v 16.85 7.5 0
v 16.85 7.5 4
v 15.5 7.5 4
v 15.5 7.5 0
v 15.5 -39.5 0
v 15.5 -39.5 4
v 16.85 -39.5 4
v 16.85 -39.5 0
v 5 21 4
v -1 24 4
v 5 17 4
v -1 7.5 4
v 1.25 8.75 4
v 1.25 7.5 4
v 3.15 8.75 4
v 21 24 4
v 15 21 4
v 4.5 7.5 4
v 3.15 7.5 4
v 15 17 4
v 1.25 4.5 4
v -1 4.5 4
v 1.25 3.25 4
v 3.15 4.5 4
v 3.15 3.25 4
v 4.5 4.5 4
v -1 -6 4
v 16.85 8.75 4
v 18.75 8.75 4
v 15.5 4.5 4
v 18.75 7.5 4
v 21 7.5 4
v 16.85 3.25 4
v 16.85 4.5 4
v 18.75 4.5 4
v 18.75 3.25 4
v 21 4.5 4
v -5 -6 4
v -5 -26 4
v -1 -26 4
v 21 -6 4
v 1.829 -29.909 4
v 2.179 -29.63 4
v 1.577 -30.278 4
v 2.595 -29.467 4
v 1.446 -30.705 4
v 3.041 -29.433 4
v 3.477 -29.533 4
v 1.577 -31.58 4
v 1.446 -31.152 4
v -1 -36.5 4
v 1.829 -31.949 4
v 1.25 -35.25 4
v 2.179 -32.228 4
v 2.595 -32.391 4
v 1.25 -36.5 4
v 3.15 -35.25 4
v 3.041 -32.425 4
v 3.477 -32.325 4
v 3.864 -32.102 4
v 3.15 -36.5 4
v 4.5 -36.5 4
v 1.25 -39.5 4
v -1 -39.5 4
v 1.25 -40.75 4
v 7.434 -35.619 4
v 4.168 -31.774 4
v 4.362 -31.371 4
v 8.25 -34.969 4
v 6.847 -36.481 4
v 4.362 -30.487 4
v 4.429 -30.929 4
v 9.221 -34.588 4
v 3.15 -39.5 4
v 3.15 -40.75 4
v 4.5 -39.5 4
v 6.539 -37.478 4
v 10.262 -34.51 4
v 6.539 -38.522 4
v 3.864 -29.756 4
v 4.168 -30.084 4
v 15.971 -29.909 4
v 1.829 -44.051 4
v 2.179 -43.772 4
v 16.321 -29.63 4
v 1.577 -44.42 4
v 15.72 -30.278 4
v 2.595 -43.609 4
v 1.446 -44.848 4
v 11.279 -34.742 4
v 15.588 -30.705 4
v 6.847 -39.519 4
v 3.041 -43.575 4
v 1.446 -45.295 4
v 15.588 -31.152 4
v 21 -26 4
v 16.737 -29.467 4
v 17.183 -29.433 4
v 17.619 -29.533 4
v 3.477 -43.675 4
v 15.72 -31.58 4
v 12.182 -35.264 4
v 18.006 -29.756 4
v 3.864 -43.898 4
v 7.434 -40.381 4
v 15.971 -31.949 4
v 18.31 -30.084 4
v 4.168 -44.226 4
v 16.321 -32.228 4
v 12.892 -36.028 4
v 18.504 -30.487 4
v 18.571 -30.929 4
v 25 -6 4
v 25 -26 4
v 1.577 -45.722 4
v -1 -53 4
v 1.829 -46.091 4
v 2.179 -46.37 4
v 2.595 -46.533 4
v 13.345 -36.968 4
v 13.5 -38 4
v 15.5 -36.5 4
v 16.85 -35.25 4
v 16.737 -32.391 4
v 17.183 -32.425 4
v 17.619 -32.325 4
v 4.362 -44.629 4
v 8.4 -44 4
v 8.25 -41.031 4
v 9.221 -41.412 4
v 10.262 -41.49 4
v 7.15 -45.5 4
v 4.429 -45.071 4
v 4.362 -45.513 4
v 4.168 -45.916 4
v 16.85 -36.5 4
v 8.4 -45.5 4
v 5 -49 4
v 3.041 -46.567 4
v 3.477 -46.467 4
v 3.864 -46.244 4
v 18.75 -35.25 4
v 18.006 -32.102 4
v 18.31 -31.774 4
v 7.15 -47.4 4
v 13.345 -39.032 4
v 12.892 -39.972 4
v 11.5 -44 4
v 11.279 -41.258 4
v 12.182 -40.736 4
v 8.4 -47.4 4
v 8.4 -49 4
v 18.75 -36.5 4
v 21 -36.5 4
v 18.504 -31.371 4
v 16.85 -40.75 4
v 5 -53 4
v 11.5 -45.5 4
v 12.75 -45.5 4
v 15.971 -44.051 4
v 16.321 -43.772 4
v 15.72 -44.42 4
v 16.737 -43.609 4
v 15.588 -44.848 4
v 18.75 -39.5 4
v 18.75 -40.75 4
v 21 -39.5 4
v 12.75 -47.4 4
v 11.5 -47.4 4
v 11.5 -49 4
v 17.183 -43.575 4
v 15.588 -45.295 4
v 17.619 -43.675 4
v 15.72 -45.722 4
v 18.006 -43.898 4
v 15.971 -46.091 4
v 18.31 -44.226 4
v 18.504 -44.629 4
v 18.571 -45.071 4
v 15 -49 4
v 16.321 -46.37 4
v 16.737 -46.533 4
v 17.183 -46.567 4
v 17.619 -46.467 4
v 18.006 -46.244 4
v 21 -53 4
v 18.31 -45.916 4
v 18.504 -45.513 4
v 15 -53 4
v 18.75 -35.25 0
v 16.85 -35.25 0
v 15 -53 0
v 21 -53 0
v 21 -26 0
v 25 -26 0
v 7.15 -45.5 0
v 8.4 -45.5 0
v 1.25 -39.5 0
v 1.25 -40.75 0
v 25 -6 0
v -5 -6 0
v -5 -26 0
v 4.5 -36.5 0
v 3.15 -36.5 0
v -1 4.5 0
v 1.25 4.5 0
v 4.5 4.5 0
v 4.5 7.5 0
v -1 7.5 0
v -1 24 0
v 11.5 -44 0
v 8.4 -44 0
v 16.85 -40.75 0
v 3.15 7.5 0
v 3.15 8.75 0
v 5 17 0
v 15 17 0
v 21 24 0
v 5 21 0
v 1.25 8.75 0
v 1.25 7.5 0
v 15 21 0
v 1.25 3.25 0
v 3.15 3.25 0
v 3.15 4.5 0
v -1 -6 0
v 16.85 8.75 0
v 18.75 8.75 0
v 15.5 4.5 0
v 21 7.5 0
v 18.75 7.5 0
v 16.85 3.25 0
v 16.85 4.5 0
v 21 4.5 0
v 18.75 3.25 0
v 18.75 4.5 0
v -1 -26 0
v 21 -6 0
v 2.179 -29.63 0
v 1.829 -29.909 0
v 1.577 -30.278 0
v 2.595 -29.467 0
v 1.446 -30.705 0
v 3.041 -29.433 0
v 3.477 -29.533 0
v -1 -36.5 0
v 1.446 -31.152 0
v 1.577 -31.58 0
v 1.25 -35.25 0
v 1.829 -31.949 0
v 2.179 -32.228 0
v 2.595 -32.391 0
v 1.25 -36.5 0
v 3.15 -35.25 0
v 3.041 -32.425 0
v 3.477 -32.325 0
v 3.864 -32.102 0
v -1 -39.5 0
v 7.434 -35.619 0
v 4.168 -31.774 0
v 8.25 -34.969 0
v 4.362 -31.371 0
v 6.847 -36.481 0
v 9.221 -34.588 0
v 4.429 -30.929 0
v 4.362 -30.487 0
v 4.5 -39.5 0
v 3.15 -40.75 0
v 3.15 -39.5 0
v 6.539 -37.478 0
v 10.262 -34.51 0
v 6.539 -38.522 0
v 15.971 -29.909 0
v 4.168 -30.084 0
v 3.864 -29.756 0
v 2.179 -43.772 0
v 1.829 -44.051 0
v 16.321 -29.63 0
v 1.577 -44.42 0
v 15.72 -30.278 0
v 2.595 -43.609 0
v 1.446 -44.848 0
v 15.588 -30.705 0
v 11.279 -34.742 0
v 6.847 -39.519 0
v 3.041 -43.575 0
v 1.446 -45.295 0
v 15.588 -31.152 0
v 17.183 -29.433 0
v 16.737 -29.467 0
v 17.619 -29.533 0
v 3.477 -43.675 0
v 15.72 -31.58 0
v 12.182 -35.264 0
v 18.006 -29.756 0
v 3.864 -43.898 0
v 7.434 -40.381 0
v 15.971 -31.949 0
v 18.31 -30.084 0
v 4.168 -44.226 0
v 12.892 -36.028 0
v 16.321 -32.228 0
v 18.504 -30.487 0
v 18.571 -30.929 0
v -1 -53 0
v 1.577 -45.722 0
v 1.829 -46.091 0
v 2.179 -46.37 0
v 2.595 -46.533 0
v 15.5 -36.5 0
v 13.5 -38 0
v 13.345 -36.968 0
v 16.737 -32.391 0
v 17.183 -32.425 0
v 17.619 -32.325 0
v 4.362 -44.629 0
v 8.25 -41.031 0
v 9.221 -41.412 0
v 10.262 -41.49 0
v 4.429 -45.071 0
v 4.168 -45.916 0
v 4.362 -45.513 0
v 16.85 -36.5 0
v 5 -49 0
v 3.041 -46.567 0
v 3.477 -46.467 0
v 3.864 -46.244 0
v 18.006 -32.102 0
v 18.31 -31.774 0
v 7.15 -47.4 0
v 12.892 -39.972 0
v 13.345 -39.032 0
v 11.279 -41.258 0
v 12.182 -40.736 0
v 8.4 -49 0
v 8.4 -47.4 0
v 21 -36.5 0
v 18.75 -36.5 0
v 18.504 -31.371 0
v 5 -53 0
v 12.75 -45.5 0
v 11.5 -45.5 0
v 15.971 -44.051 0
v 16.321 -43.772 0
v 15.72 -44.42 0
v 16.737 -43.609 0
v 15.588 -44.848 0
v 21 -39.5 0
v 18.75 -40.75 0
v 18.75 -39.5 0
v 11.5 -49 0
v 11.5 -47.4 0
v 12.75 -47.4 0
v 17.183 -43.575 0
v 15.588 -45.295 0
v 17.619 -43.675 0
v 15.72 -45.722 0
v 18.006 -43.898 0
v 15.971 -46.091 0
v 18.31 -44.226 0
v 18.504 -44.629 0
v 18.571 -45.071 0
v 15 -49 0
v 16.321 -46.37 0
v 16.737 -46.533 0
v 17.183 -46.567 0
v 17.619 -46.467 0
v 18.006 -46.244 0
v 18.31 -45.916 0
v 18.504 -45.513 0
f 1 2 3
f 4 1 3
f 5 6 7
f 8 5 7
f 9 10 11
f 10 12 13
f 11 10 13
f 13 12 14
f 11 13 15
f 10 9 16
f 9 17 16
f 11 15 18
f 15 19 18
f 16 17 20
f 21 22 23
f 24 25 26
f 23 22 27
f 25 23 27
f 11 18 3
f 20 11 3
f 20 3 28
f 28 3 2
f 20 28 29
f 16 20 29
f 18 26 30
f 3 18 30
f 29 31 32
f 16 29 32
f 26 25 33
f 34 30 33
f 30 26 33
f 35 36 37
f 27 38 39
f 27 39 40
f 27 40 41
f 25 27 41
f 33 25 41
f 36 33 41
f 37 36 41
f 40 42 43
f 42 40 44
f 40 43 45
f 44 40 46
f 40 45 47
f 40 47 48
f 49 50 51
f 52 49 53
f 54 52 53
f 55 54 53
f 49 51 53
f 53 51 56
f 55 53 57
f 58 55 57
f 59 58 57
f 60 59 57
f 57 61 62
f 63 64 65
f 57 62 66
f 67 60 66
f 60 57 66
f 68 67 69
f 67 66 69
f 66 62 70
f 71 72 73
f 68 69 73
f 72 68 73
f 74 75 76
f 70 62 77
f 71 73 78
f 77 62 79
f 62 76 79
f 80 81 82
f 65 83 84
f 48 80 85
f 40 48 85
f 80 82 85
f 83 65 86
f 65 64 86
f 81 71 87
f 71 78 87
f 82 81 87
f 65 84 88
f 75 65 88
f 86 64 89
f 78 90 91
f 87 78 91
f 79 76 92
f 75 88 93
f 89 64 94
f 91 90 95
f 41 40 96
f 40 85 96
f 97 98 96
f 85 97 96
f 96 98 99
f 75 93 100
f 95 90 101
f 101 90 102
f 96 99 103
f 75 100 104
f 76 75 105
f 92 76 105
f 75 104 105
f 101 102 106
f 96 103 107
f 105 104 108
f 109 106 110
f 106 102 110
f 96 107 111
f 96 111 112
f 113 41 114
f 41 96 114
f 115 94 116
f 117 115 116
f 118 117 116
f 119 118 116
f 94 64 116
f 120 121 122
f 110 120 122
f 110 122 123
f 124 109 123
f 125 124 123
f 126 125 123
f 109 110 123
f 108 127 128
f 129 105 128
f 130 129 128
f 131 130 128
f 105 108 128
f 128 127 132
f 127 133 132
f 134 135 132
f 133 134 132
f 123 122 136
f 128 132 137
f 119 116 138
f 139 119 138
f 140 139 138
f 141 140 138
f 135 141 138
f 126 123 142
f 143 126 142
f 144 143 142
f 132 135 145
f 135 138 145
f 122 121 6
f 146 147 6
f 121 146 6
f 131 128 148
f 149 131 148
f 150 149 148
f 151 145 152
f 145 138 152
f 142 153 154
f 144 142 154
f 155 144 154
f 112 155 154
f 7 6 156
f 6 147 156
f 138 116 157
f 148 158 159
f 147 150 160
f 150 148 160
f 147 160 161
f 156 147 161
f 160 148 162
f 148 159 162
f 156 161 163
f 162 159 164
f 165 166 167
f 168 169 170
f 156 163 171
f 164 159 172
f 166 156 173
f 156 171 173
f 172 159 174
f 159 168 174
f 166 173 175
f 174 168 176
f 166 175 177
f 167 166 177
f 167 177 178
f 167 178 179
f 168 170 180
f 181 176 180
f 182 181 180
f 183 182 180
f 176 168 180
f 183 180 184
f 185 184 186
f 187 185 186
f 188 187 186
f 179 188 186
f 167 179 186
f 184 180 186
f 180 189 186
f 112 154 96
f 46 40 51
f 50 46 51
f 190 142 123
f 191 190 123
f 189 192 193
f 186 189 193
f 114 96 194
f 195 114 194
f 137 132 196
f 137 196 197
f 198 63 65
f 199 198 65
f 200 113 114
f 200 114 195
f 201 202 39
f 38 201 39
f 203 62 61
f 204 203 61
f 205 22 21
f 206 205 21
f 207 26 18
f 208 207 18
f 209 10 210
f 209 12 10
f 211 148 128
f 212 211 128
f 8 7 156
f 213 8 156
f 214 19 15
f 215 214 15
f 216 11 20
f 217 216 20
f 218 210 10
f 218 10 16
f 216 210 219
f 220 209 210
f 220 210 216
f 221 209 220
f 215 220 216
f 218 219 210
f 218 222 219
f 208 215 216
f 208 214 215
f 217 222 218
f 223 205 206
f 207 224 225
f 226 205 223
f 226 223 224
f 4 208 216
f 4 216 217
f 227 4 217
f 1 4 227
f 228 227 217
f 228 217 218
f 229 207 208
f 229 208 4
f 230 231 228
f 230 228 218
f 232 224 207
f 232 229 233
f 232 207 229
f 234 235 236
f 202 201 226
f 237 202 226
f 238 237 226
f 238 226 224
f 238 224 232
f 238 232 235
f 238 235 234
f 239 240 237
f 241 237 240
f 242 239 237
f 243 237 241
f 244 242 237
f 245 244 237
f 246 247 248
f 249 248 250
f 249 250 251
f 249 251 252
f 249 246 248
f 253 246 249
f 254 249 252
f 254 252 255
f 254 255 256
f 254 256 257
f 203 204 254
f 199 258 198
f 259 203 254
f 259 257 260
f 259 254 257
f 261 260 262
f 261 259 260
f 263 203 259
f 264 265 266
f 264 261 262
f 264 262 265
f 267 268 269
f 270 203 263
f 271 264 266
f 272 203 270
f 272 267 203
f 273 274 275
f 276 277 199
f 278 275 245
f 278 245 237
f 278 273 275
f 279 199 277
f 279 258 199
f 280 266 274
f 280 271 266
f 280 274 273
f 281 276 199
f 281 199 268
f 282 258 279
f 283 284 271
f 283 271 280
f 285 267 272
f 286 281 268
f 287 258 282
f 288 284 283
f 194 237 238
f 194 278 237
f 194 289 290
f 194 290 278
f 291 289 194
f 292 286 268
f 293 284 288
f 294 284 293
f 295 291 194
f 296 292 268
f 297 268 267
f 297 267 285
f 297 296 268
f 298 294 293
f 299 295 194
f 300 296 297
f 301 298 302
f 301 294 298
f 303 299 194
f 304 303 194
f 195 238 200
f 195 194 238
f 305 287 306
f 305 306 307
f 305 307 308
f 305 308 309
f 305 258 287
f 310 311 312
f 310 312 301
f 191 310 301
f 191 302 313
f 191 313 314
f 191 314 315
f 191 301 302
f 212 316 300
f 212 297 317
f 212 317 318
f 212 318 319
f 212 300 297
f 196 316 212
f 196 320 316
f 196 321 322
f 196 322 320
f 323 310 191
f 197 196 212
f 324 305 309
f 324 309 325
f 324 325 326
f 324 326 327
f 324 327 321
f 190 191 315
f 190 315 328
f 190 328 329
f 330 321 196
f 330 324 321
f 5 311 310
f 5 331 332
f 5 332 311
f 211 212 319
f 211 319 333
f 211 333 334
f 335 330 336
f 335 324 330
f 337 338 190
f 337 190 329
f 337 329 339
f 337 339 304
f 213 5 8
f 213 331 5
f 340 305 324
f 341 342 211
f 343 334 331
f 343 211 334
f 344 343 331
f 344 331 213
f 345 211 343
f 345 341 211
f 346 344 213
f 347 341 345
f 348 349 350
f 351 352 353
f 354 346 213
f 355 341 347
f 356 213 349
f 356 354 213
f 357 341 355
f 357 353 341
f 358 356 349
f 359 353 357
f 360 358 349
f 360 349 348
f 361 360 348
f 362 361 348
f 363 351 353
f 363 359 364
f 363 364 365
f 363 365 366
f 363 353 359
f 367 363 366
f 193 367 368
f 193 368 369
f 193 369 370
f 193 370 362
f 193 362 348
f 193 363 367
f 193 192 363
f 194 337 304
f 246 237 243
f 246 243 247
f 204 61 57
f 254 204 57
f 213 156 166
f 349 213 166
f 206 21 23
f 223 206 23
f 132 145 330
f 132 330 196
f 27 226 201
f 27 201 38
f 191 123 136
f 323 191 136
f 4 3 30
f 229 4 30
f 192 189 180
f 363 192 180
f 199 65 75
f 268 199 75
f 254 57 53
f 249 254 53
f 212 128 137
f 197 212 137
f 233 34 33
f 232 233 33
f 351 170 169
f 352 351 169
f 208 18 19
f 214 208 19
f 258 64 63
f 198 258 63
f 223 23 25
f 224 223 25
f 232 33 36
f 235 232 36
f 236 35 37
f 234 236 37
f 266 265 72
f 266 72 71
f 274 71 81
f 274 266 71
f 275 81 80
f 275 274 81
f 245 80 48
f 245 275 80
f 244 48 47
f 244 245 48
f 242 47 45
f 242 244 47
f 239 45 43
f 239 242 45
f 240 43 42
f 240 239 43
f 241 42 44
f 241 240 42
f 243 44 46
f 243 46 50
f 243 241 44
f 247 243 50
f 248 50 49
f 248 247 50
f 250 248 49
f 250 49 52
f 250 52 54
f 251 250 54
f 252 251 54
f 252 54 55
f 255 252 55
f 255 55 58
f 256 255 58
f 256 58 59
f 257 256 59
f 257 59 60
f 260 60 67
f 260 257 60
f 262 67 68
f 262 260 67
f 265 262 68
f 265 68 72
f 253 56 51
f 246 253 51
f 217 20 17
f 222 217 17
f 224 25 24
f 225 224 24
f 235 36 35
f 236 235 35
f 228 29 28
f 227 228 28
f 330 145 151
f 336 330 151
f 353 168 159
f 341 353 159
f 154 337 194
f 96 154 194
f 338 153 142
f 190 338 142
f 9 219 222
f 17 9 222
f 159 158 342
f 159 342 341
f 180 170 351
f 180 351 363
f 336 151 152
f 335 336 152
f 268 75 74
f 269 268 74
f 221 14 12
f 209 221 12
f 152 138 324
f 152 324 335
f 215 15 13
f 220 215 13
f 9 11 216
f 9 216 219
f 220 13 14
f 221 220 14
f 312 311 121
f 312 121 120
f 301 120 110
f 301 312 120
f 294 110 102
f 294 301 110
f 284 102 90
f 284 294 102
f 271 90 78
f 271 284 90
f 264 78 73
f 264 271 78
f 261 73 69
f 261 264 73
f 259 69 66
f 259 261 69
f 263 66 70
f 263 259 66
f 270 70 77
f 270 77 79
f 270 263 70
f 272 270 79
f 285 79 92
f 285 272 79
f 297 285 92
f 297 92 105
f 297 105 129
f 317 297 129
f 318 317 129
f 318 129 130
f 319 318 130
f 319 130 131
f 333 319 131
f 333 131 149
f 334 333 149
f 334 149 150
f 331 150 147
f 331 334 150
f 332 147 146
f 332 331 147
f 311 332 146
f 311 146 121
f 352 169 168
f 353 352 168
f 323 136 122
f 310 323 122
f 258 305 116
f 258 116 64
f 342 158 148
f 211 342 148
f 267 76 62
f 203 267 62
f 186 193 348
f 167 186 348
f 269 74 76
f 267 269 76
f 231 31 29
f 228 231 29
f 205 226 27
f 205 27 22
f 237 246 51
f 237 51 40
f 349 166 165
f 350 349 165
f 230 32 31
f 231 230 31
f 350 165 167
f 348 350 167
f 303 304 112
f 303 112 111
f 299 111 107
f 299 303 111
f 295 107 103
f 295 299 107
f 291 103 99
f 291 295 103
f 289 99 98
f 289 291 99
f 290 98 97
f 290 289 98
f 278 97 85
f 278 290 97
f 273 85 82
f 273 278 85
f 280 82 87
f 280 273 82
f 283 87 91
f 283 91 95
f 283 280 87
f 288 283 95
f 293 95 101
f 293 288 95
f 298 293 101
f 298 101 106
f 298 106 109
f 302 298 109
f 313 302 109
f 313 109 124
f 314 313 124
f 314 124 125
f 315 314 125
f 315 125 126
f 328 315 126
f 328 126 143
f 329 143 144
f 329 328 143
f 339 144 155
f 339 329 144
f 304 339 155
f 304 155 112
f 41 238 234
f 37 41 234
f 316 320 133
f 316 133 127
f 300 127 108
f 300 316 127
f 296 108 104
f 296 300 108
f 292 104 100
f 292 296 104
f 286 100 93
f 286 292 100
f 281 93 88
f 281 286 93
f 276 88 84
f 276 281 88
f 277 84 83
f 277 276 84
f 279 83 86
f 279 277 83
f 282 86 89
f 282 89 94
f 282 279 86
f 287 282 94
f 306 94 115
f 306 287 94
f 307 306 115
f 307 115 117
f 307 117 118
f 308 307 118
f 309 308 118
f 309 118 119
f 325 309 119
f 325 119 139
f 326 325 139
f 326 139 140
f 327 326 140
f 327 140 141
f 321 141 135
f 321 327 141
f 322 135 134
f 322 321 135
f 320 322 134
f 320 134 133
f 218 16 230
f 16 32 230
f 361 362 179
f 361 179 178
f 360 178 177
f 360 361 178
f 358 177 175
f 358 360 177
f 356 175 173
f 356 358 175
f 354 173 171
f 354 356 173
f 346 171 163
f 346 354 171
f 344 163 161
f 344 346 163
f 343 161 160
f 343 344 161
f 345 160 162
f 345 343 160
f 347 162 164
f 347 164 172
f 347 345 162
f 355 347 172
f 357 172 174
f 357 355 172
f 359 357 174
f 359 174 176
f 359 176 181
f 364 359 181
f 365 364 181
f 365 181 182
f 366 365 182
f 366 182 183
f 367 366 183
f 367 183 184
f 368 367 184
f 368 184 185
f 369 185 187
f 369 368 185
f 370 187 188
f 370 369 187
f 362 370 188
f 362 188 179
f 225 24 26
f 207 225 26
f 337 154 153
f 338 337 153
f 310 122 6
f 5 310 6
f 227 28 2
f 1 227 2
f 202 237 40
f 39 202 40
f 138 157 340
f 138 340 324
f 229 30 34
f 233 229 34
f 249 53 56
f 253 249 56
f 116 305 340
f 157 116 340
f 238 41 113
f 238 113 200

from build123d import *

# Parameters (mm, degrees)
SKETCH1_W                     = 22
SKETCH1_H                     = 74
SKETCH1_R                     = 3.5
SHEET_THICKNESS_DEPTH         = 4
BEARING_START                 = -4
SKETCH2_R                     = 3.5
SKETCH2_R_2                   = 1.5
BEARING_HOLDER_MOUNTING_DEPTH = 4
NUT_MOUNTING_DEPTH            = 4
SKETCH5_W                     = 10
SKETCH5_H                     = 4
TOP_SLOTS_DEPTH               = 4
SKETCH9_W                     = 4
SKETCH9_H                     = 20
BOSS_EXTRUDE3_DEPTH           = 4
SKETCH10_W                    = 4
SKETCH10_H                    = 20
BOSS_EXTRUDE4_DEPTH           = 4
SKETCH11_W                    = 22
SKETCH11_H                    = 4
BOSS_EXTRUDE5_DEPTH           = 3
SKETCH14_W                    = 1.55
SKETCH14_H                    = 1.5
SKETCH14_H_2                  = 1.9
SKETCH14_H_3                  = 1.6
SKETCH14_W_2                  = 1.25
CUT_EXTRUDE4_DEPTH            = 10


with BuildPart() as part:
    # Sketch1 → Sheet Thickness (new body)
    with BuildSketch(Plane.XY):
        with Locations((10, -16)):
            Rectangle(SKETCH1_W, SKETCH1_H)
        with Locations((10, -38)):
            Circle(SKETCH1_R, mode=Mode.SUBTRACT)
    extrude(amount=SHEET_THICKNESS_DEPTH)

    # Sketch2 → Bearing Holder Mounting (cut)
    with BuildSketch(Plane.XY.offset(4).offset(BEARING_START)):
        with Locations((10, -38)):
            Circle(SKETCH2_R)
        with Locations((2.928932188, -30.928932188)):
            Circle(SKETCH2_R_2)
        with Locations((17.071067812, -30.928932188)):
            Circle(SKETCH2_R_2)
        with Locations((17.071067812, -45.071067812)):
            Circle(SKETCH2_R_2)
        with Locations((2.928932188, -45.071067812)):
            Circle(SKETCH2_R_2)
    extrude(amount=BEARING_HOLDER_MOUNTING_DEPTH, mode=Mode.SUBTRACT)

    # Sketch3 → Nut Mounting (cut)
    with BuildSketch(Plane.XY.offset(4)):
        Polygon((1.25, -36.5), (-1, -36.5), (-1, -39.5), (1.25, -39.5), (1.25, -40.75), (3.15, -40.75), (3.15, -39.5), (4.5, -39.5), (4.5, -36.5), (3.15, -36.5), (3.15, -35.25), (1.25, -35.25), align=None)
        Polygon((18.75, -39.5), (21, -39.5), (21, -36.5), (18.75, -36.5), (18.75, -35.25), (16.85, -35.25), (16.85, -36.5), (15.5, -36.5), (15.5, -39.5), (16.85, -39.5), (16.85, -40.75), (18.75, -40.75), align=None)
        Polygon((16.85, 3.25), (18.75, 3.25), (18.75, 4.5), (21, 4.5), (21, 7.5), (18.75, 7.5), (18.75, 8.75), (16.85, 8.75), (16.85, 7.5), (15.5, 7.5), (15.5, 4.5), (16.85, 4.5), align=None)
        Polygon((1.25, 3.25), (3.15, 3.25), (3.15, 4.5), (4.5, 4.5), (4.5, 7.5), (3.15, 7.5), (3.15, 8.75), (1.25, 8.75), (1.25, 7.5), (-1, 7.5), (-1, 4.5), (1.25, 4.5), align=None)
    extrude(amount=-NUT_MOUNTING_DEPTH, mode=Mode.SUBTRACT)

    # Sketch5 → Top Slots (cut)
    with BuildSketch(Plane.XY.offset(4)):
        with Locations((10, -51)):
            Rectangle(SKETCH5_W, SKETCH5_H)
        with Locations((10, 19)):
            Rectangle(SKETCH5_W, SKETCH5_H)
    extrude(amount=-TOP_SLOTS_DEPTH, mode=Mode.SUBTRACT)

    # Sketch9 → Boss-Extrude3 (add)
    with BuildSketch(Plane.ZY.offset(1)):
        with Locations((2, -16)):
            Rectangle(SKETCH9_W, SKETCH9_H)
    extrude(amount=BOSS_EXTRUDE3_DEPTH)

    # Sketch10 → Boss-Extrude4 (add)
    with BuildSketch(Plane(origin=(21, 0, 0), x_dir=(0, 0, -1), z_dir=(1, 0, 0))):
        with Locations((-2, -16)):
            Rectangle(SKETCH10_W, SKETCH10_H)
    extrude(amount=BOSS_EXTRUDE4_DEPTH)

    # Sketch11 → Boss-Extrude5 (add)
    with BuildSketch(Plane(origin=(0, 21, 0), x_dir=(1, 0, 0), z_dir=(0, 1, 0))):
        with Locations((10, -2)):
            Rectangle(SKETCH11_W, SKETCH11_H)
    extrude(amount=BOSS_EXTRUDE5_DEPTH)

    # Sketch14 → Cut-Extrude4 (cut)
    with BuildSketch(Plane.XY.offset(4)):
        with Locations((9.175, -44.75)):
            Rectangle(SKETCH14_W, SKETCH14_H)
        with Locations((10.725, -44.75)):
            Rectangle(SKETCH14_W, SKETCH14_H)
        with Locations((9.175, -46.45)):
            Rectangle(SKETCH14_W, SKETCH14_H_2)
        with Locations((10.725, -46.45)):
            Rectangle(SKETCH14_W, SKETCH14_H_2)
        with Locations((10.725, -48.2)):
            Rectangle(SKETCH14_W, SKETCH14_H_3)
        with Locations((9.175, -48.2)):
            Rectangle(SKETCH14_W, SKETCH14_H_3)
        with Locations((7.775, -46.45)):
            Rectangle(SKETCH14_W_2, SKETCH14_H_2)
        with Locations((12.125, -46.45)):
            Rectangle(SKETCH14_W_2, SKETCH14_H_2)
    extrude(amount=-CUT_EXTRUDE4_DEPTH, mode=Mode.SUBTRACT)


solid = part.part
